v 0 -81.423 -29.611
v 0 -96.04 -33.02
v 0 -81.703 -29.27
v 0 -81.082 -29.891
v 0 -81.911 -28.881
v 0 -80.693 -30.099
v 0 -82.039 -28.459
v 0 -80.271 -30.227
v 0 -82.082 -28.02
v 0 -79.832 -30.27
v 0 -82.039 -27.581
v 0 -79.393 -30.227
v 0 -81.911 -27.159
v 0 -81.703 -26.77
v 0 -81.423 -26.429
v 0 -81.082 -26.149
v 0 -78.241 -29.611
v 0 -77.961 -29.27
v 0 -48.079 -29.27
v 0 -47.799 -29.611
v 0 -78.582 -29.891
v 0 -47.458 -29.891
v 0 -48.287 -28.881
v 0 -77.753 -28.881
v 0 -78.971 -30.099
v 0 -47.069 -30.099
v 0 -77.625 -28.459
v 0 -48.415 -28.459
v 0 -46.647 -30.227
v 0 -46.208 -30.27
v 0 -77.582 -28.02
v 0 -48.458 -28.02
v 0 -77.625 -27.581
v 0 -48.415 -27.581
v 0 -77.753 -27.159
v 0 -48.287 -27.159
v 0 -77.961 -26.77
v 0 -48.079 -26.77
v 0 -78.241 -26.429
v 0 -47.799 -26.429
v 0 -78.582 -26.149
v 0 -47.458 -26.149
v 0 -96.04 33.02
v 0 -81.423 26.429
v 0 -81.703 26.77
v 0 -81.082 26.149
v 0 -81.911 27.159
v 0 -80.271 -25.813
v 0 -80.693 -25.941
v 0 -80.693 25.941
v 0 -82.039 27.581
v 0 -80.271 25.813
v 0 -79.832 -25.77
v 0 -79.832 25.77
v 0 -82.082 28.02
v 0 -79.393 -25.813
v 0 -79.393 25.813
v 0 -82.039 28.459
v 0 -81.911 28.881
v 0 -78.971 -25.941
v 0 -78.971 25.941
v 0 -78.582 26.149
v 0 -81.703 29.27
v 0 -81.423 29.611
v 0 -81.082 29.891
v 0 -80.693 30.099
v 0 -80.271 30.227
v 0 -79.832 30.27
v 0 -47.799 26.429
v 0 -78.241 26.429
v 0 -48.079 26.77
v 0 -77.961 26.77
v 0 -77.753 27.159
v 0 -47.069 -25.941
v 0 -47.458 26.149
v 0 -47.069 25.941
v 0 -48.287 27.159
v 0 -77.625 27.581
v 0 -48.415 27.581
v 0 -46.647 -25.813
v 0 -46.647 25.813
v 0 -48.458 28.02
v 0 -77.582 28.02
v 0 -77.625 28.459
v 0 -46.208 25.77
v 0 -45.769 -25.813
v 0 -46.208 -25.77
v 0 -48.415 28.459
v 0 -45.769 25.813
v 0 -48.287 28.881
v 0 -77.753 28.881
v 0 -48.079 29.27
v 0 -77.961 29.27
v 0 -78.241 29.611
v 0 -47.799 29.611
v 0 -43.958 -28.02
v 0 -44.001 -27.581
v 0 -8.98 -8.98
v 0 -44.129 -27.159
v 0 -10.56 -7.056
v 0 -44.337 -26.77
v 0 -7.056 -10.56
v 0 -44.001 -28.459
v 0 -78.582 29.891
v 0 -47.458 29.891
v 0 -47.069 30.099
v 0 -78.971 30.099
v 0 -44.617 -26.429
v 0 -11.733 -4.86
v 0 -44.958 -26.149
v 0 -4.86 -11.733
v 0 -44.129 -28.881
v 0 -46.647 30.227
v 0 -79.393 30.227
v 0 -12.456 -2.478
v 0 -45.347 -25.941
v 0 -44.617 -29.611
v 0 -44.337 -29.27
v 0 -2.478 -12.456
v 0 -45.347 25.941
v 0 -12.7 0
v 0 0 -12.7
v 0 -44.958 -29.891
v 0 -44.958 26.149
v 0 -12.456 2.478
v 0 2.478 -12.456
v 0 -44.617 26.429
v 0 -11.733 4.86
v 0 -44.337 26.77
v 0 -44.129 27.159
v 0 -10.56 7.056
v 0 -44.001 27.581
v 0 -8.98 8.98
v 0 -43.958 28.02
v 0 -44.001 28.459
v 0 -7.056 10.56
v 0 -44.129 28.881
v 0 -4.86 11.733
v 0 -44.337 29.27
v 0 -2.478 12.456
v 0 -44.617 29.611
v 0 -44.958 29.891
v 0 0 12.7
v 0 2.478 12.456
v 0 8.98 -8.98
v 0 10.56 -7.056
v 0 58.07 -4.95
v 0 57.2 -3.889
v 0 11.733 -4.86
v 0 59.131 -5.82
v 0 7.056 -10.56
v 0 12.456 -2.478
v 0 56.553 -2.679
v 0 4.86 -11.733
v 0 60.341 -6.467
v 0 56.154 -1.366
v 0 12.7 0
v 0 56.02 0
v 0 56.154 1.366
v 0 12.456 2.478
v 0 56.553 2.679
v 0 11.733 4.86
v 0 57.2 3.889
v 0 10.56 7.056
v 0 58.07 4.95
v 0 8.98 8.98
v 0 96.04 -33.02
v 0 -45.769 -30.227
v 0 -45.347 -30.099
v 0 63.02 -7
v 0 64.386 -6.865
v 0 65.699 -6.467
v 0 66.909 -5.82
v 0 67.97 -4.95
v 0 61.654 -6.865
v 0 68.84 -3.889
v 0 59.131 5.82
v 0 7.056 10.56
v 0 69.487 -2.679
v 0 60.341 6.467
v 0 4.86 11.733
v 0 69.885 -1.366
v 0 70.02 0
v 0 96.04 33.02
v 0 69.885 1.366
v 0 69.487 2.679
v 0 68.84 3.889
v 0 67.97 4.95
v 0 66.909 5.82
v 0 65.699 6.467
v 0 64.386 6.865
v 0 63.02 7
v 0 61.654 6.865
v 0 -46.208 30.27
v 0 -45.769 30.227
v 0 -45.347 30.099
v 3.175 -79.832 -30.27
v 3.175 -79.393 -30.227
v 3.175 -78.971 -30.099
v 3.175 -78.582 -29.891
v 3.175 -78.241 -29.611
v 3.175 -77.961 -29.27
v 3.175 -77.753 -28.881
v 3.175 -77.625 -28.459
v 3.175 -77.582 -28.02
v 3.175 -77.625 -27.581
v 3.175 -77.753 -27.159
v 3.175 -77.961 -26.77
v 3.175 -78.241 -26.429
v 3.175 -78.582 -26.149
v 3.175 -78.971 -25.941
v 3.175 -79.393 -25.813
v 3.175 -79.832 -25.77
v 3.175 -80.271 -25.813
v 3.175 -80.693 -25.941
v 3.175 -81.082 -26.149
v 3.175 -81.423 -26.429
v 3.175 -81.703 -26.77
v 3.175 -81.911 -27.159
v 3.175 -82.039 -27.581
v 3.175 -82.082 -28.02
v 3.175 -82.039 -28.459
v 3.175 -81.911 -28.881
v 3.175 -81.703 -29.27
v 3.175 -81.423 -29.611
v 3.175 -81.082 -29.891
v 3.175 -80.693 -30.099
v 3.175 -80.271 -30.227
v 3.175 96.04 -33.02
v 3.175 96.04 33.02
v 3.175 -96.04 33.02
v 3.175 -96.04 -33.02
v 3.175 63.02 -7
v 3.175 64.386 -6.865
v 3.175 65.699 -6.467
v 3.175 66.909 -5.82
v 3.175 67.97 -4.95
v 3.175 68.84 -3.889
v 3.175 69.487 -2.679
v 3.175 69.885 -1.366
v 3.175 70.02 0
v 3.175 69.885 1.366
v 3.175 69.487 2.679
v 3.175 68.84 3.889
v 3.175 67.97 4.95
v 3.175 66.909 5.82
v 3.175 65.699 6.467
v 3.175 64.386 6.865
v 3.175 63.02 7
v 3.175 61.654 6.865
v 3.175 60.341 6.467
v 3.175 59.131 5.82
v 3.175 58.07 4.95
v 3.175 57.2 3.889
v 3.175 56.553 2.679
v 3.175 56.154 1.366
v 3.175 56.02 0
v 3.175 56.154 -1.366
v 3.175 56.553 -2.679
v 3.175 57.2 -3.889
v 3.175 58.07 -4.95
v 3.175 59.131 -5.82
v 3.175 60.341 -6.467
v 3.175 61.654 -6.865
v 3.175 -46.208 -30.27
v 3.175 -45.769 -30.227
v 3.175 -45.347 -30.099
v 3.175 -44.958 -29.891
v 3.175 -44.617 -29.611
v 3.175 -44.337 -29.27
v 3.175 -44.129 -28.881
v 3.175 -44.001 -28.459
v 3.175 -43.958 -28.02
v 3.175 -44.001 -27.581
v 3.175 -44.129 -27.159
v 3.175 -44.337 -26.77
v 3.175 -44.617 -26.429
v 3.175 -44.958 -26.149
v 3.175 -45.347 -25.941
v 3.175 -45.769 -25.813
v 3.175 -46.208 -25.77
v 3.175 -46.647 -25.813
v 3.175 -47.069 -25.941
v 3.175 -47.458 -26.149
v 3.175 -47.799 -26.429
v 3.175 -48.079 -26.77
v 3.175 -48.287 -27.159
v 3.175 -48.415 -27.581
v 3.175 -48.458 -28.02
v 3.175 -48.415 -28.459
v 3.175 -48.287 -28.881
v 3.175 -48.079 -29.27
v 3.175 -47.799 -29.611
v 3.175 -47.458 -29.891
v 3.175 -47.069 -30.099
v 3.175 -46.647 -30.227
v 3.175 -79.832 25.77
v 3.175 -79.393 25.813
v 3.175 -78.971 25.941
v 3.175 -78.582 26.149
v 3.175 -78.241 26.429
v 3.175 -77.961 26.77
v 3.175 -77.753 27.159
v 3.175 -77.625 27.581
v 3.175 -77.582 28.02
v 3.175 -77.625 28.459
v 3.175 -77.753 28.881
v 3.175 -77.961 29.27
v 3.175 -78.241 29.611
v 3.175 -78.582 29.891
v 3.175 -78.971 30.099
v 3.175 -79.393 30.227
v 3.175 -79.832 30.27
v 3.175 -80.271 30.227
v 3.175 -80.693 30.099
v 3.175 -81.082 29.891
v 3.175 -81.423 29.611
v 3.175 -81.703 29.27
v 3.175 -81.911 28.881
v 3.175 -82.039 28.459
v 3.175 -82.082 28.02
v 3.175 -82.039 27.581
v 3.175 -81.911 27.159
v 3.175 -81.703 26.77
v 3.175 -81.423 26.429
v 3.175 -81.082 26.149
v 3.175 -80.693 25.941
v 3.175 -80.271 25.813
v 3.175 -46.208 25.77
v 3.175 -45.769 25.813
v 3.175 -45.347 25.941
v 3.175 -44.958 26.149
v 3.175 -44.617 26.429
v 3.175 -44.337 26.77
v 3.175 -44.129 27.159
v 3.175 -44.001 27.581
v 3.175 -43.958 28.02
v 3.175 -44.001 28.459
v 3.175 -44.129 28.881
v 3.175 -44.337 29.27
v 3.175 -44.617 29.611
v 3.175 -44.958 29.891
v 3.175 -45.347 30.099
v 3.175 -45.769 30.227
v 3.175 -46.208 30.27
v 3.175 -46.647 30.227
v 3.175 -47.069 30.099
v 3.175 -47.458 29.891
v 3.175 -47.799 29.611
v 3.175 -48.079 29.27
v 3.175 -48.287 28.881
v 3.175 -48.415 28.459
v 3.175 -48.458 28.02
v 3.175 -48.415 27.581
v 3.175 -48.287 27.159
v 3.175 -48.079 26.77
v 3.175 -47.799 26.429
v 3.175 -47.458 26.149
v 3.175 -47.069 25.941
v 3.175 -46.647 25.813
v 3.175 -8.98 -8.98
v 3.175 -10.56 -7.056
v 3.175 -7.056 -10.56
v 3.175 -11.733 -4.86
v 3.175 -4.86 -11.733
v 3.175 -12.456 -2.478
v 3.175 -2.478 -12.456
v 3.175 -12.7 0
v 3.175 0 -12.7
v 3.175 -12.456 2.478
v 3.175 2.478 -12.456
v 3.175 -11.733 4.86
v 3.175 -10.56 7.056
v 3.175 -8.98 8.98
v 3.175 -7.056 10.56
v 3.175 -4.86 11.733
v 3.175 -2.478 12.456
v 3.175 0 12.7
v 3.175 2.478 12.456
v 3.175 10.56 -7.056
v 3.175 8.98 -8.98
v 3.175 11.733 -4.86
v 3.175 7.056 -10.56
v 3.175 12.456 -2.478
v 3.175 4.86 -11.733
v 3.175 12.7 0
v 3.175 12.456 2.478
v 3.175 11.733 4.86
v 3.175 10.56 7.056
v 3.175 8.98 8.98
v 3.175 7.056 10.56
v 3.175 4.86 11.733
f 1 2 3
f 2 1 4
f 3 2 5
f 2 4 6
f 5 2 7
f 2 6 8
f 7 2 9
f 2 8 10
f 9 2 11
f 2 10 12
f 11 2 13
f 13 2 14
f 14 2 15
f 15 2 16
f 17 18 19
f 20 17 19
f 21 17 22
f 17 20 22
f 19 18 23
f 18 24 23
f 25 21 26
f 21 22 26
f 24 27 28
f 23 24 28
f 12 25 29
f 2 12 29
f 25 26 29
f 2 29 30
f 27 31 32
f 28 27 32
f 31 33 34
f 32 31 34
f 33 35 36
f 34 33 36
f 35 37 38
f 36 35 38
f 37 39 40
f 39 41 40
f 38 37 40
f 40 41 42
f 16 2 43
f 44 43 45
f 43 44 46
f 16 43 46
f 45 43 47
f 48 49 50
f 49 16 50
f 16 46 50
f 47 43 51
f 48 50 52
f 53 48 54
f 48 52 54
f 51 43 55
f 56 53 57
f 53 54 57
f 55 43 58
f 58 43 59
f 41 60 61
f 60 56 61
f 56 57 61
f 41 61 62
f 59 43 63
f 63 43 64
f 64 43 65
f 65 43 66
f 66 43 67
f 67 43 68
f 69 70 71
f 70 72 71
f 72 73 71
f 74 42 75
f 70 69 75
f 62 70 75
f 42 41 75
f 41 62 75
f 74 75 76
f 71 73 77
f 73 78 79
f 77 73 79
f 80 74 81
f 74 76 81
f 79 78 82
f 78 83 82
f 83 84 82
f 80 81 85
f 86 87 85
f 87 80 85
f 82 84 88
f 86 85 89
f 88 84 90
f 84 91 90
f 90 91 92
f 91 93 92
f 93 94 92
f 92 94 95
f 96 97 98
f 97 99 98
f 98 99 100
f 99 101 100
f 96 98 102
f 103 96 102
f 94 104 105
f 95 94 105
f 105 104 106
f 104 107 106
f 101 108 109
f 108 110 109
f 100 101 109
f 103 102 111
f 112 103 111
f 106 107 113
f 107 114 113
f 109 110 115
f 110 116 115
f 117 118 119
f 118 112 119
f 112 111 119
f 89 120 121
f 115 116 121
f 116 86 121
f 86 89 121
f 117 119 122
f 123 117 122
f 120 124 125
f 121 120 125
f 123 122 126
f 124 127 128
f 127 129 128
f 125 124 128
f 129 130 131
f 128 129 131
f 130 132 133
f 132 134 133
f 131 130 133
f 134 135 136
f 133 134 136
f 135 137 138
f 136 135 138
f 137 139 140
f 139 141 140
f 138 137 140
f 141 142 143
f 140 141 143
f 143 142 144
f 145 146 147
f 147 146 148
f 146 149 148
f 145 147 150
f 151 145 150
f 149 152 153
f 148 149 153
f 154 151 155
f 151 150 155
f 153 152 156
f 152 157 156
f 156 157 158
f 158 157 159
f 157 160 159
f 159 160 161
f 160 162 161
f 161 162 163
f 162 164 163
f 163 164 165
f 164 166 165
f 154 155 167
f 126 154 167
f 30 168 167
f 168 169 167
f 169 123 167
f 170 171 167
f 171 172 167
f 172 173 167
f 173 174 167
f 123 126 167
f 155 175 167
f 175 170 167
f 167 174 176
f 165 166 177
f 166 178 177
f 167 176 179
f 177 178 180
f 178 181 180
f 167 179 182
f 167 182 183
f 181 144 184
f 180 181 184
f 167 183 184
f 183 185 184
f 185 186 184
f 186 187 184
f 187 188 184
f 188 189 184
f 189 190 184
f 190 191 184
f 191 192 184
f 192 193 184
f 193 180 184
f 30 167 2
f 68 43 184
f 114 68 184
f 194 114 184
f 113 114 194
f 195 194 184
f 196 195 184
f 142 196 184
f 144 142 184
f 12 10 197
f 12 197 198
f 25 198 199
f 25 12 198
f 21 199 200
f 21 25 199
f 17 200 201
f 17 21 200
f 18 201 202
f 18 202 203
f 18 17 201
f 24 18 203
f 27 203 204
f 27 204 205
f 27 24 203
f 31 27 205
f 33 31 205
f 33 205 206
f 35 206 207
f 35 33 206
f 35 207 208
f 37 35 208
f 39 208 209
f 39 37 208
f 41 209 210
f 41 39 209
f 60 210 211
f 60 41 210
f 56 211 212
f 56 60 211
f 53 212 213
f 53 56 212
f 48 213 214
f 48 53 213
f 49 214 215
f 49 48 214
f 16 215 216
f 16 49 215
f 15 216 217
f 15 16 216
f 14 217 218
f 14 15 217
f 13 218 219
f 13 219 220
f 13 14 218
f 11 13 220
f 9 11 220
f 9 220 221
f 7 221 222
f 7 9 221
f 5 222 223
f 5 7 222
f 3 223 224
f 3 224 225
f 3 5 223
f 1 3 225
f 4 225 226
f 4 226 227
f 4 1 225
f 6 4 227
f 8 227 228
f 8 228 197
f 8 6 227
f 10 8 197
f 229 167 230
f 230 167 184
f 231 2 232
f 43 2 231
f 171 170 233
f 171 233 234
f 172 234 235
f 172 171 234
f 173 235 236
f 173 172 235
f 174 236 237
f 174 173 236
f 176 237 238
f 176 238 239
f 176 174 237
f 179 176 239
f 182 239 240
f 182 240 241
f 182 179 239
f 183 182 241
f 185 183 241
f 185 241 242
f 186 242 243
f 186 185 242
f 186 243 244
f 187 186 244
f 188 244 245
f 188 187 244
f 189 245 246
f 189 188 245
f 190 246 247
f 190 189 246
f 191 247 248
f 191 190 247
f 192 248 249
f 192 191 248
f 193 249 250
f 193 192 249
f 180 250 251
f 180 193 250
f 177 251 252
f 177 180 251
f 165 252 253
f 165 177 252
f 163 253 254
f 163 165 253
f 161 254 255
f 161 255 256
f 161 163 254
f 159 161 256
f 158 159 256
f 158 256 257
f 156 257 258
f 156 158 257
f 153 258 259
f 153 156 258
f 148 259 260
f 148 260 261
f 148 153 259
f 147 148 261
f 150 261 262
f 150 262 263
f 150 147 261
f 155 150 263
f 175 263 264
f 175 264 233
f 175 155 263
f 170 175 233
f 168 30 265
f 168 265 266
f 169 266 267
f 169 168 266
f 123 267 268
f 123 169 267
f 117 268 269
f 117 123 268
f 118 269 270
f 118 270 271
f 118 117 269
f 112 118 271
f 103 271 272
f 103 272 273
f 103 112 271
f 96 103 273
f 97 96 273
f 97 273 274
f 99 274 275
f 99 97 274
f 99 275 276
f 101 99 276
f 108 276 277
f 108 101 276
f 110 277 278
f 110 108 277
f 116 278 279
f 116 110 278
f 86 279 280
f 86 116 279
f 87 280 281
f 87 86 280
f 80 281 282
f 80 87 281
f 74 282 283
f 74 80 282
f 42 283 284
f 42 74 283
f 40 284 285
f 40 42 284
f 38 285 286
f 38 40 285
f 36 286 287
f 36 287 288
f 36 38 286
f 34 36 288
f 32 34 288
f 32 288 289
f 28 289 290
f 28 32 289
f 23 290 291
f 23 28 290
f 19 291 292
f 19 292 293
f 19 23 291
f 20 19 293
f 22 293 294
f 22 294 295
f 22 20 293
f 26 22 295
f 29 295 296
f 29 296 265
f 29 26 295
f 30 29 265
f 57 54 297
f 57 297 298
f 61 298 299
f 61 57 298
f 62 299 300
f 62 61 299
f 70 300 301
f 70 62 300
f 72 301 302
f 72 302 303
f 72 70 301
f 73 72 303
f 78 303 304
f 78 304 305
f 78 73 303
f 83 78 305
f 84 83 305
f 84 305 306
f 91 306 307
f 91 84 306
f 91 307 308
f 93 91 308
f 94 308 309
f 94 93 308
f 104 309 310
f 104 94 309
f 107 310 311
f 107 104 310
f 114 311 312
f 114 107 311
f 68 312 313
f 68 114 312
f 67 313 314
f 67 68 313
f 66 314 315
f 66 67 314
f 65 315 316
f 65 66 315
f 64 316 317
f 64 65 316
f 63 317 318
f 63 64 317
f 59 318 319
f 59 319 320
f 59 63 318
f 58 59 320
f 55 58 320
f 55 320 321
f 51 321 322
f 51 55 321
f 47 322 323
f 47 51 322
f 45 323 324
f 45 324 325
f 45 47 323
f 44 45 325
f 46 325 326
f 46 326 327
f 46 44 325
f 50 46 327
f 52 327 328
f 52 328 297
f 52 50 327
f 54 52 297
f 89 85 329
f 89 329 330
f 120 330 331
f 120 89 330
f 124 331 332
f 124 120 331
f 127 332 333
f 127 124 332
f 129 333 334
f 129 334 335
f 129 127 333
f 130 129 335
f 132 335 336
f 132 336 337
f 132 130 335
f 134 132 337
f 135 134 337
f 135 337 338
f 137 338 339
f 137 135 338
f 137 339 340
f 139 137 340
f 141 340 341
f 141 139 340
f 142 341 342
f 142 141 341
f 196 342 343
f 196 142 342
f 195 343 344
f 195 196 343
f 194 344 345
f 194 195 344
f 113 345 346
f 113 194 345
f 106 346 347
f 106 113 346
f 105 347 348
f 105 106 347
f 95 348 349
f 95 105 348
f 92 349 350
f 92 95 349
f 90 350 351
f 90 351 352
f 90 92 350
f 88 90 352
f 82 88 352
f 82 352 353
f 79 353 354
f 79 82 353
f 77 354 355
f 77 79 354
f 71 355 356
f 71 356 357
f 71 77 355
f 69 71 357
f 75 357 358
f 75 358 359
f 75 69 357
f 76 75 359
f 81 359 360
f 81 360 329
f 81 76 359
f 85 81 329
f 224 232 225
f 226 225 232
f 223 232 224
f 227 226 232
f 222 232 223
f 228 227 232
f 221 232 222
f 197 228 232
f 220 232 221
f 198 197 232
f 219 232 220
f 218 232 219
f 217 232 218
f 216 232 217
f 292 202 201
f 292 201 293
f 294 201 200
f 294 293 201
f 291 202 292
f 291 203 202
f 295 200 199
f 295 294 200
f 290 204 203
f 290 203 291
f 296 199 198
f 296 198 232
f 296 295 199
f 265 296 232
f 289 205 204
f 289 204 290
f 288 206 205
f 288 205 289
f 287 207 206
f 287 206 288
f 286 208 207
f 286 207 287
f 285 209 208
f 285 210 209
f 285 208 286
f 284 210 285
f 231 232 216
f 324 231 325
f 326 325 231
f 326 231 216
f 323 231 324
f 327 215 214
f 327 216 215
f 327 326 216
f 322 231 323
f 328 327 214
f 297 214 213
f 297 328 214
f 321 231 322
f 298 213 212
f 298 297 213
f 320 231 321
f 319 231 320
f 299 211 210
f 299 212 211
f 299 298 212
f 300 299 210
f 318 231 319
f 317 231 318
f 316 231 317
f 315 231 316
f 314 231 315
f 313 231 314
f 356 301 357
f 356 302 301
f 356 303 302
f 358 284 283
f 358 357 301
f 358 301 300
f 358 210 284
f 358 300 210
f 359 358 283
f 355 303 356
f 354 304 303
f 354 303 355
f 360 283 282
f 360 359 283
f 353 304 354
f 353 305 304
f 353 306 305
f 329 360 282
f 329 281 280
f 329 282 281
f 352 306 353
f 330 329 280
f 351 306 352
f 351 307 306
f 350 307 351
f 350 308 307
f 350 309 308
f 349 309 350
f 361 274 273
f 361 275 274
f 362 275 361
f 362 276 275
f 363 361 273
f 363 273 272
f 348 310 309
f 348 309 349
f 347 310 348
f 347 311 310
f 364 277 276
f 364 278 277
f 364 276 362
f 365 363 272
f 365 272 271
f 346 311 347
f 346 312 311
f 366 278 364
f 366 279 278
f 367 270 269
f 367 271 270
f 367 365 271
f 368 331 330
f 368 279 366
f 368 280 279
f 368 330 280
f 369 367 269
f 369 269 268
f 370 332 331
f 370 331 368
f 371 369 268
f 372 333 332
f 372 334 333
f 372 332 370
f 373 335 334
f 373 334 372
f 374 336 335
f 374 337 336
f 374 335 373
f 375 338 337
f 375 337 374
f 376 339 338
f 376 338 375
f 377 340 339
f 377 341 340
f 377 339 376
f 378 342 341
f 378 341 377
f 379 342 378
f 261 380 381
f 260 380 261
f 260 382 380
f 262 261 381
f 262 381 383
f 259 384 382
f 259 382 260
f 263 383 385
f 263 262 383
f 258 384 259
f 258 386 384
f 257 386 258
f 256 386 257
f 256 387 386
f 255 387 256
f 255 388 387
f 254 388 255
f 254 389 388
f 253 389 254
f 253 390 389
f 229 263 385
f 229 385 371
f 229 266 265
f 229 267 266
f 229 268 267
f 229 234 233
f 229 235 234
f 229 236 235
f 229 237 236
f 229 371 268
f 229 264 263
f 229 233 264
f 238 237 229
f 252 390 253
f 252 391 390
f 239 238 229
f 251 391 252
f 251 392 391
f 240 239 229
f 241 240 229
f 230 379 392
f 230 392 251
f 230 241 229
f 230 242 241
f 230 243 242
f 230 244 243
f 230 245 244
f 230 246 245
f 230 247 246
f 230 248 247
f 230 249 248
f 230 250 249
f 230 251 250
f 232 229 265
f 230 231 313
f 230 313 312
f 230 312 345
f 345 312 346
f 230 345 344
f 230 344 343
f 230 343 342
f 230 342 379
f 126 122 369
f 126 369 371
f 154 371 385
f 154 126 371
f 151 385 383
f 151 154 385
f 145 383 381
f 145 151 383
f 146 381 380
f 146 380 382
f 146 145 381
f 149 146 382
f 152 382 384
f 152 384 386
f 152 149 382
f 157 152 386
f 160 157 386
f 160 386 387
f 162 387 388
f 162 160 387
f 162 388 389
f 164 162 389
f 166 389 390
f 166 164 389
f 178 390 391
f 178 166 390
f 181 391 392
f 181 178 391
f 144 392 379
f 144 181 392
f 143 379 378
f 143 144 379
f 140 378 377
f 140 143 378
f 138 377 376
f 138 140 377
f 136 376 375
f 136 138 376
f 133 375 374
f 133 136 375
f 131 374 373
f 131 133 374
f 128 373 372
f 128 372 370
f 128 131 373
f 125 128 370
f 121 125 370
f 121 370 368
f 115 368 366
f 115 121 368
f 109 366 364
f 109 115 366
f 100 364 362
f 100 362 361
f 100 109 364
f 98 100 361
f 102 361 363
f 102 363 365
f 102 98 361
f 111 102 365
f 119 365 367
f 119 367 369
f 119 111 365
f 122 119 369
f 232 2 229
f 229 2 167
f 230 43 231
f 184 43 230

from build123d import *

# Parameters (mm, degrees)
SKETCH1_W           = 192.07988
SKETCH1_H           = 66.04
SKETCH1_R           = 7
SKETCH1_R_2         = 12.7
SKETCH1_R_3         = 2.25
BOSS_EXTRUDE1_DEPTH = 3.175


with BuildPart() as part:
    # Sketch1 → Boss-Extrude1 (new body)
    with BuildSketch(Plane.YZ):
        Rectangle(SKETCH1_W, SKETCH1_H)
        with Locations(Location((63.01994, 0, 0), (0, 0, 270))):
            Circle(SKETCH1_R, mode=Mode.SUBTRACT)
        with Locations(Location((0, 0, 0), (0, 0, 270))):
            Circle(SKETCH1_R_2, mode=Mode.SUBTRACT)
        with Locations(Location((-79.831946, 28.02001, 0), (0, 0, 270))):
            Circle(SKETCH1_R_3, mode=Mode.SUBTRACT)
        with Locations(Location((-79.831946, -28.02001, 0), (0, 0, 270))):
            Circle(SKETCH1_R_3, mode=Mode.SUBTRACT)
        with Locations(Location((-46.207934, -28.02001, 0), (0, 0, 270))):
            Circle(SKETCH1_R_3, mode=Mode.SUBTRACT)
        with Locations(Location((-46.207934, 28.02001, 0), (0, 0, 270))):
            Circle(SKETCH1_R_3, mode=Mode.SUBTRACT)
    extrude(amount=BOSS_EXTRUDE1_DEPTH)


solid = part.part
